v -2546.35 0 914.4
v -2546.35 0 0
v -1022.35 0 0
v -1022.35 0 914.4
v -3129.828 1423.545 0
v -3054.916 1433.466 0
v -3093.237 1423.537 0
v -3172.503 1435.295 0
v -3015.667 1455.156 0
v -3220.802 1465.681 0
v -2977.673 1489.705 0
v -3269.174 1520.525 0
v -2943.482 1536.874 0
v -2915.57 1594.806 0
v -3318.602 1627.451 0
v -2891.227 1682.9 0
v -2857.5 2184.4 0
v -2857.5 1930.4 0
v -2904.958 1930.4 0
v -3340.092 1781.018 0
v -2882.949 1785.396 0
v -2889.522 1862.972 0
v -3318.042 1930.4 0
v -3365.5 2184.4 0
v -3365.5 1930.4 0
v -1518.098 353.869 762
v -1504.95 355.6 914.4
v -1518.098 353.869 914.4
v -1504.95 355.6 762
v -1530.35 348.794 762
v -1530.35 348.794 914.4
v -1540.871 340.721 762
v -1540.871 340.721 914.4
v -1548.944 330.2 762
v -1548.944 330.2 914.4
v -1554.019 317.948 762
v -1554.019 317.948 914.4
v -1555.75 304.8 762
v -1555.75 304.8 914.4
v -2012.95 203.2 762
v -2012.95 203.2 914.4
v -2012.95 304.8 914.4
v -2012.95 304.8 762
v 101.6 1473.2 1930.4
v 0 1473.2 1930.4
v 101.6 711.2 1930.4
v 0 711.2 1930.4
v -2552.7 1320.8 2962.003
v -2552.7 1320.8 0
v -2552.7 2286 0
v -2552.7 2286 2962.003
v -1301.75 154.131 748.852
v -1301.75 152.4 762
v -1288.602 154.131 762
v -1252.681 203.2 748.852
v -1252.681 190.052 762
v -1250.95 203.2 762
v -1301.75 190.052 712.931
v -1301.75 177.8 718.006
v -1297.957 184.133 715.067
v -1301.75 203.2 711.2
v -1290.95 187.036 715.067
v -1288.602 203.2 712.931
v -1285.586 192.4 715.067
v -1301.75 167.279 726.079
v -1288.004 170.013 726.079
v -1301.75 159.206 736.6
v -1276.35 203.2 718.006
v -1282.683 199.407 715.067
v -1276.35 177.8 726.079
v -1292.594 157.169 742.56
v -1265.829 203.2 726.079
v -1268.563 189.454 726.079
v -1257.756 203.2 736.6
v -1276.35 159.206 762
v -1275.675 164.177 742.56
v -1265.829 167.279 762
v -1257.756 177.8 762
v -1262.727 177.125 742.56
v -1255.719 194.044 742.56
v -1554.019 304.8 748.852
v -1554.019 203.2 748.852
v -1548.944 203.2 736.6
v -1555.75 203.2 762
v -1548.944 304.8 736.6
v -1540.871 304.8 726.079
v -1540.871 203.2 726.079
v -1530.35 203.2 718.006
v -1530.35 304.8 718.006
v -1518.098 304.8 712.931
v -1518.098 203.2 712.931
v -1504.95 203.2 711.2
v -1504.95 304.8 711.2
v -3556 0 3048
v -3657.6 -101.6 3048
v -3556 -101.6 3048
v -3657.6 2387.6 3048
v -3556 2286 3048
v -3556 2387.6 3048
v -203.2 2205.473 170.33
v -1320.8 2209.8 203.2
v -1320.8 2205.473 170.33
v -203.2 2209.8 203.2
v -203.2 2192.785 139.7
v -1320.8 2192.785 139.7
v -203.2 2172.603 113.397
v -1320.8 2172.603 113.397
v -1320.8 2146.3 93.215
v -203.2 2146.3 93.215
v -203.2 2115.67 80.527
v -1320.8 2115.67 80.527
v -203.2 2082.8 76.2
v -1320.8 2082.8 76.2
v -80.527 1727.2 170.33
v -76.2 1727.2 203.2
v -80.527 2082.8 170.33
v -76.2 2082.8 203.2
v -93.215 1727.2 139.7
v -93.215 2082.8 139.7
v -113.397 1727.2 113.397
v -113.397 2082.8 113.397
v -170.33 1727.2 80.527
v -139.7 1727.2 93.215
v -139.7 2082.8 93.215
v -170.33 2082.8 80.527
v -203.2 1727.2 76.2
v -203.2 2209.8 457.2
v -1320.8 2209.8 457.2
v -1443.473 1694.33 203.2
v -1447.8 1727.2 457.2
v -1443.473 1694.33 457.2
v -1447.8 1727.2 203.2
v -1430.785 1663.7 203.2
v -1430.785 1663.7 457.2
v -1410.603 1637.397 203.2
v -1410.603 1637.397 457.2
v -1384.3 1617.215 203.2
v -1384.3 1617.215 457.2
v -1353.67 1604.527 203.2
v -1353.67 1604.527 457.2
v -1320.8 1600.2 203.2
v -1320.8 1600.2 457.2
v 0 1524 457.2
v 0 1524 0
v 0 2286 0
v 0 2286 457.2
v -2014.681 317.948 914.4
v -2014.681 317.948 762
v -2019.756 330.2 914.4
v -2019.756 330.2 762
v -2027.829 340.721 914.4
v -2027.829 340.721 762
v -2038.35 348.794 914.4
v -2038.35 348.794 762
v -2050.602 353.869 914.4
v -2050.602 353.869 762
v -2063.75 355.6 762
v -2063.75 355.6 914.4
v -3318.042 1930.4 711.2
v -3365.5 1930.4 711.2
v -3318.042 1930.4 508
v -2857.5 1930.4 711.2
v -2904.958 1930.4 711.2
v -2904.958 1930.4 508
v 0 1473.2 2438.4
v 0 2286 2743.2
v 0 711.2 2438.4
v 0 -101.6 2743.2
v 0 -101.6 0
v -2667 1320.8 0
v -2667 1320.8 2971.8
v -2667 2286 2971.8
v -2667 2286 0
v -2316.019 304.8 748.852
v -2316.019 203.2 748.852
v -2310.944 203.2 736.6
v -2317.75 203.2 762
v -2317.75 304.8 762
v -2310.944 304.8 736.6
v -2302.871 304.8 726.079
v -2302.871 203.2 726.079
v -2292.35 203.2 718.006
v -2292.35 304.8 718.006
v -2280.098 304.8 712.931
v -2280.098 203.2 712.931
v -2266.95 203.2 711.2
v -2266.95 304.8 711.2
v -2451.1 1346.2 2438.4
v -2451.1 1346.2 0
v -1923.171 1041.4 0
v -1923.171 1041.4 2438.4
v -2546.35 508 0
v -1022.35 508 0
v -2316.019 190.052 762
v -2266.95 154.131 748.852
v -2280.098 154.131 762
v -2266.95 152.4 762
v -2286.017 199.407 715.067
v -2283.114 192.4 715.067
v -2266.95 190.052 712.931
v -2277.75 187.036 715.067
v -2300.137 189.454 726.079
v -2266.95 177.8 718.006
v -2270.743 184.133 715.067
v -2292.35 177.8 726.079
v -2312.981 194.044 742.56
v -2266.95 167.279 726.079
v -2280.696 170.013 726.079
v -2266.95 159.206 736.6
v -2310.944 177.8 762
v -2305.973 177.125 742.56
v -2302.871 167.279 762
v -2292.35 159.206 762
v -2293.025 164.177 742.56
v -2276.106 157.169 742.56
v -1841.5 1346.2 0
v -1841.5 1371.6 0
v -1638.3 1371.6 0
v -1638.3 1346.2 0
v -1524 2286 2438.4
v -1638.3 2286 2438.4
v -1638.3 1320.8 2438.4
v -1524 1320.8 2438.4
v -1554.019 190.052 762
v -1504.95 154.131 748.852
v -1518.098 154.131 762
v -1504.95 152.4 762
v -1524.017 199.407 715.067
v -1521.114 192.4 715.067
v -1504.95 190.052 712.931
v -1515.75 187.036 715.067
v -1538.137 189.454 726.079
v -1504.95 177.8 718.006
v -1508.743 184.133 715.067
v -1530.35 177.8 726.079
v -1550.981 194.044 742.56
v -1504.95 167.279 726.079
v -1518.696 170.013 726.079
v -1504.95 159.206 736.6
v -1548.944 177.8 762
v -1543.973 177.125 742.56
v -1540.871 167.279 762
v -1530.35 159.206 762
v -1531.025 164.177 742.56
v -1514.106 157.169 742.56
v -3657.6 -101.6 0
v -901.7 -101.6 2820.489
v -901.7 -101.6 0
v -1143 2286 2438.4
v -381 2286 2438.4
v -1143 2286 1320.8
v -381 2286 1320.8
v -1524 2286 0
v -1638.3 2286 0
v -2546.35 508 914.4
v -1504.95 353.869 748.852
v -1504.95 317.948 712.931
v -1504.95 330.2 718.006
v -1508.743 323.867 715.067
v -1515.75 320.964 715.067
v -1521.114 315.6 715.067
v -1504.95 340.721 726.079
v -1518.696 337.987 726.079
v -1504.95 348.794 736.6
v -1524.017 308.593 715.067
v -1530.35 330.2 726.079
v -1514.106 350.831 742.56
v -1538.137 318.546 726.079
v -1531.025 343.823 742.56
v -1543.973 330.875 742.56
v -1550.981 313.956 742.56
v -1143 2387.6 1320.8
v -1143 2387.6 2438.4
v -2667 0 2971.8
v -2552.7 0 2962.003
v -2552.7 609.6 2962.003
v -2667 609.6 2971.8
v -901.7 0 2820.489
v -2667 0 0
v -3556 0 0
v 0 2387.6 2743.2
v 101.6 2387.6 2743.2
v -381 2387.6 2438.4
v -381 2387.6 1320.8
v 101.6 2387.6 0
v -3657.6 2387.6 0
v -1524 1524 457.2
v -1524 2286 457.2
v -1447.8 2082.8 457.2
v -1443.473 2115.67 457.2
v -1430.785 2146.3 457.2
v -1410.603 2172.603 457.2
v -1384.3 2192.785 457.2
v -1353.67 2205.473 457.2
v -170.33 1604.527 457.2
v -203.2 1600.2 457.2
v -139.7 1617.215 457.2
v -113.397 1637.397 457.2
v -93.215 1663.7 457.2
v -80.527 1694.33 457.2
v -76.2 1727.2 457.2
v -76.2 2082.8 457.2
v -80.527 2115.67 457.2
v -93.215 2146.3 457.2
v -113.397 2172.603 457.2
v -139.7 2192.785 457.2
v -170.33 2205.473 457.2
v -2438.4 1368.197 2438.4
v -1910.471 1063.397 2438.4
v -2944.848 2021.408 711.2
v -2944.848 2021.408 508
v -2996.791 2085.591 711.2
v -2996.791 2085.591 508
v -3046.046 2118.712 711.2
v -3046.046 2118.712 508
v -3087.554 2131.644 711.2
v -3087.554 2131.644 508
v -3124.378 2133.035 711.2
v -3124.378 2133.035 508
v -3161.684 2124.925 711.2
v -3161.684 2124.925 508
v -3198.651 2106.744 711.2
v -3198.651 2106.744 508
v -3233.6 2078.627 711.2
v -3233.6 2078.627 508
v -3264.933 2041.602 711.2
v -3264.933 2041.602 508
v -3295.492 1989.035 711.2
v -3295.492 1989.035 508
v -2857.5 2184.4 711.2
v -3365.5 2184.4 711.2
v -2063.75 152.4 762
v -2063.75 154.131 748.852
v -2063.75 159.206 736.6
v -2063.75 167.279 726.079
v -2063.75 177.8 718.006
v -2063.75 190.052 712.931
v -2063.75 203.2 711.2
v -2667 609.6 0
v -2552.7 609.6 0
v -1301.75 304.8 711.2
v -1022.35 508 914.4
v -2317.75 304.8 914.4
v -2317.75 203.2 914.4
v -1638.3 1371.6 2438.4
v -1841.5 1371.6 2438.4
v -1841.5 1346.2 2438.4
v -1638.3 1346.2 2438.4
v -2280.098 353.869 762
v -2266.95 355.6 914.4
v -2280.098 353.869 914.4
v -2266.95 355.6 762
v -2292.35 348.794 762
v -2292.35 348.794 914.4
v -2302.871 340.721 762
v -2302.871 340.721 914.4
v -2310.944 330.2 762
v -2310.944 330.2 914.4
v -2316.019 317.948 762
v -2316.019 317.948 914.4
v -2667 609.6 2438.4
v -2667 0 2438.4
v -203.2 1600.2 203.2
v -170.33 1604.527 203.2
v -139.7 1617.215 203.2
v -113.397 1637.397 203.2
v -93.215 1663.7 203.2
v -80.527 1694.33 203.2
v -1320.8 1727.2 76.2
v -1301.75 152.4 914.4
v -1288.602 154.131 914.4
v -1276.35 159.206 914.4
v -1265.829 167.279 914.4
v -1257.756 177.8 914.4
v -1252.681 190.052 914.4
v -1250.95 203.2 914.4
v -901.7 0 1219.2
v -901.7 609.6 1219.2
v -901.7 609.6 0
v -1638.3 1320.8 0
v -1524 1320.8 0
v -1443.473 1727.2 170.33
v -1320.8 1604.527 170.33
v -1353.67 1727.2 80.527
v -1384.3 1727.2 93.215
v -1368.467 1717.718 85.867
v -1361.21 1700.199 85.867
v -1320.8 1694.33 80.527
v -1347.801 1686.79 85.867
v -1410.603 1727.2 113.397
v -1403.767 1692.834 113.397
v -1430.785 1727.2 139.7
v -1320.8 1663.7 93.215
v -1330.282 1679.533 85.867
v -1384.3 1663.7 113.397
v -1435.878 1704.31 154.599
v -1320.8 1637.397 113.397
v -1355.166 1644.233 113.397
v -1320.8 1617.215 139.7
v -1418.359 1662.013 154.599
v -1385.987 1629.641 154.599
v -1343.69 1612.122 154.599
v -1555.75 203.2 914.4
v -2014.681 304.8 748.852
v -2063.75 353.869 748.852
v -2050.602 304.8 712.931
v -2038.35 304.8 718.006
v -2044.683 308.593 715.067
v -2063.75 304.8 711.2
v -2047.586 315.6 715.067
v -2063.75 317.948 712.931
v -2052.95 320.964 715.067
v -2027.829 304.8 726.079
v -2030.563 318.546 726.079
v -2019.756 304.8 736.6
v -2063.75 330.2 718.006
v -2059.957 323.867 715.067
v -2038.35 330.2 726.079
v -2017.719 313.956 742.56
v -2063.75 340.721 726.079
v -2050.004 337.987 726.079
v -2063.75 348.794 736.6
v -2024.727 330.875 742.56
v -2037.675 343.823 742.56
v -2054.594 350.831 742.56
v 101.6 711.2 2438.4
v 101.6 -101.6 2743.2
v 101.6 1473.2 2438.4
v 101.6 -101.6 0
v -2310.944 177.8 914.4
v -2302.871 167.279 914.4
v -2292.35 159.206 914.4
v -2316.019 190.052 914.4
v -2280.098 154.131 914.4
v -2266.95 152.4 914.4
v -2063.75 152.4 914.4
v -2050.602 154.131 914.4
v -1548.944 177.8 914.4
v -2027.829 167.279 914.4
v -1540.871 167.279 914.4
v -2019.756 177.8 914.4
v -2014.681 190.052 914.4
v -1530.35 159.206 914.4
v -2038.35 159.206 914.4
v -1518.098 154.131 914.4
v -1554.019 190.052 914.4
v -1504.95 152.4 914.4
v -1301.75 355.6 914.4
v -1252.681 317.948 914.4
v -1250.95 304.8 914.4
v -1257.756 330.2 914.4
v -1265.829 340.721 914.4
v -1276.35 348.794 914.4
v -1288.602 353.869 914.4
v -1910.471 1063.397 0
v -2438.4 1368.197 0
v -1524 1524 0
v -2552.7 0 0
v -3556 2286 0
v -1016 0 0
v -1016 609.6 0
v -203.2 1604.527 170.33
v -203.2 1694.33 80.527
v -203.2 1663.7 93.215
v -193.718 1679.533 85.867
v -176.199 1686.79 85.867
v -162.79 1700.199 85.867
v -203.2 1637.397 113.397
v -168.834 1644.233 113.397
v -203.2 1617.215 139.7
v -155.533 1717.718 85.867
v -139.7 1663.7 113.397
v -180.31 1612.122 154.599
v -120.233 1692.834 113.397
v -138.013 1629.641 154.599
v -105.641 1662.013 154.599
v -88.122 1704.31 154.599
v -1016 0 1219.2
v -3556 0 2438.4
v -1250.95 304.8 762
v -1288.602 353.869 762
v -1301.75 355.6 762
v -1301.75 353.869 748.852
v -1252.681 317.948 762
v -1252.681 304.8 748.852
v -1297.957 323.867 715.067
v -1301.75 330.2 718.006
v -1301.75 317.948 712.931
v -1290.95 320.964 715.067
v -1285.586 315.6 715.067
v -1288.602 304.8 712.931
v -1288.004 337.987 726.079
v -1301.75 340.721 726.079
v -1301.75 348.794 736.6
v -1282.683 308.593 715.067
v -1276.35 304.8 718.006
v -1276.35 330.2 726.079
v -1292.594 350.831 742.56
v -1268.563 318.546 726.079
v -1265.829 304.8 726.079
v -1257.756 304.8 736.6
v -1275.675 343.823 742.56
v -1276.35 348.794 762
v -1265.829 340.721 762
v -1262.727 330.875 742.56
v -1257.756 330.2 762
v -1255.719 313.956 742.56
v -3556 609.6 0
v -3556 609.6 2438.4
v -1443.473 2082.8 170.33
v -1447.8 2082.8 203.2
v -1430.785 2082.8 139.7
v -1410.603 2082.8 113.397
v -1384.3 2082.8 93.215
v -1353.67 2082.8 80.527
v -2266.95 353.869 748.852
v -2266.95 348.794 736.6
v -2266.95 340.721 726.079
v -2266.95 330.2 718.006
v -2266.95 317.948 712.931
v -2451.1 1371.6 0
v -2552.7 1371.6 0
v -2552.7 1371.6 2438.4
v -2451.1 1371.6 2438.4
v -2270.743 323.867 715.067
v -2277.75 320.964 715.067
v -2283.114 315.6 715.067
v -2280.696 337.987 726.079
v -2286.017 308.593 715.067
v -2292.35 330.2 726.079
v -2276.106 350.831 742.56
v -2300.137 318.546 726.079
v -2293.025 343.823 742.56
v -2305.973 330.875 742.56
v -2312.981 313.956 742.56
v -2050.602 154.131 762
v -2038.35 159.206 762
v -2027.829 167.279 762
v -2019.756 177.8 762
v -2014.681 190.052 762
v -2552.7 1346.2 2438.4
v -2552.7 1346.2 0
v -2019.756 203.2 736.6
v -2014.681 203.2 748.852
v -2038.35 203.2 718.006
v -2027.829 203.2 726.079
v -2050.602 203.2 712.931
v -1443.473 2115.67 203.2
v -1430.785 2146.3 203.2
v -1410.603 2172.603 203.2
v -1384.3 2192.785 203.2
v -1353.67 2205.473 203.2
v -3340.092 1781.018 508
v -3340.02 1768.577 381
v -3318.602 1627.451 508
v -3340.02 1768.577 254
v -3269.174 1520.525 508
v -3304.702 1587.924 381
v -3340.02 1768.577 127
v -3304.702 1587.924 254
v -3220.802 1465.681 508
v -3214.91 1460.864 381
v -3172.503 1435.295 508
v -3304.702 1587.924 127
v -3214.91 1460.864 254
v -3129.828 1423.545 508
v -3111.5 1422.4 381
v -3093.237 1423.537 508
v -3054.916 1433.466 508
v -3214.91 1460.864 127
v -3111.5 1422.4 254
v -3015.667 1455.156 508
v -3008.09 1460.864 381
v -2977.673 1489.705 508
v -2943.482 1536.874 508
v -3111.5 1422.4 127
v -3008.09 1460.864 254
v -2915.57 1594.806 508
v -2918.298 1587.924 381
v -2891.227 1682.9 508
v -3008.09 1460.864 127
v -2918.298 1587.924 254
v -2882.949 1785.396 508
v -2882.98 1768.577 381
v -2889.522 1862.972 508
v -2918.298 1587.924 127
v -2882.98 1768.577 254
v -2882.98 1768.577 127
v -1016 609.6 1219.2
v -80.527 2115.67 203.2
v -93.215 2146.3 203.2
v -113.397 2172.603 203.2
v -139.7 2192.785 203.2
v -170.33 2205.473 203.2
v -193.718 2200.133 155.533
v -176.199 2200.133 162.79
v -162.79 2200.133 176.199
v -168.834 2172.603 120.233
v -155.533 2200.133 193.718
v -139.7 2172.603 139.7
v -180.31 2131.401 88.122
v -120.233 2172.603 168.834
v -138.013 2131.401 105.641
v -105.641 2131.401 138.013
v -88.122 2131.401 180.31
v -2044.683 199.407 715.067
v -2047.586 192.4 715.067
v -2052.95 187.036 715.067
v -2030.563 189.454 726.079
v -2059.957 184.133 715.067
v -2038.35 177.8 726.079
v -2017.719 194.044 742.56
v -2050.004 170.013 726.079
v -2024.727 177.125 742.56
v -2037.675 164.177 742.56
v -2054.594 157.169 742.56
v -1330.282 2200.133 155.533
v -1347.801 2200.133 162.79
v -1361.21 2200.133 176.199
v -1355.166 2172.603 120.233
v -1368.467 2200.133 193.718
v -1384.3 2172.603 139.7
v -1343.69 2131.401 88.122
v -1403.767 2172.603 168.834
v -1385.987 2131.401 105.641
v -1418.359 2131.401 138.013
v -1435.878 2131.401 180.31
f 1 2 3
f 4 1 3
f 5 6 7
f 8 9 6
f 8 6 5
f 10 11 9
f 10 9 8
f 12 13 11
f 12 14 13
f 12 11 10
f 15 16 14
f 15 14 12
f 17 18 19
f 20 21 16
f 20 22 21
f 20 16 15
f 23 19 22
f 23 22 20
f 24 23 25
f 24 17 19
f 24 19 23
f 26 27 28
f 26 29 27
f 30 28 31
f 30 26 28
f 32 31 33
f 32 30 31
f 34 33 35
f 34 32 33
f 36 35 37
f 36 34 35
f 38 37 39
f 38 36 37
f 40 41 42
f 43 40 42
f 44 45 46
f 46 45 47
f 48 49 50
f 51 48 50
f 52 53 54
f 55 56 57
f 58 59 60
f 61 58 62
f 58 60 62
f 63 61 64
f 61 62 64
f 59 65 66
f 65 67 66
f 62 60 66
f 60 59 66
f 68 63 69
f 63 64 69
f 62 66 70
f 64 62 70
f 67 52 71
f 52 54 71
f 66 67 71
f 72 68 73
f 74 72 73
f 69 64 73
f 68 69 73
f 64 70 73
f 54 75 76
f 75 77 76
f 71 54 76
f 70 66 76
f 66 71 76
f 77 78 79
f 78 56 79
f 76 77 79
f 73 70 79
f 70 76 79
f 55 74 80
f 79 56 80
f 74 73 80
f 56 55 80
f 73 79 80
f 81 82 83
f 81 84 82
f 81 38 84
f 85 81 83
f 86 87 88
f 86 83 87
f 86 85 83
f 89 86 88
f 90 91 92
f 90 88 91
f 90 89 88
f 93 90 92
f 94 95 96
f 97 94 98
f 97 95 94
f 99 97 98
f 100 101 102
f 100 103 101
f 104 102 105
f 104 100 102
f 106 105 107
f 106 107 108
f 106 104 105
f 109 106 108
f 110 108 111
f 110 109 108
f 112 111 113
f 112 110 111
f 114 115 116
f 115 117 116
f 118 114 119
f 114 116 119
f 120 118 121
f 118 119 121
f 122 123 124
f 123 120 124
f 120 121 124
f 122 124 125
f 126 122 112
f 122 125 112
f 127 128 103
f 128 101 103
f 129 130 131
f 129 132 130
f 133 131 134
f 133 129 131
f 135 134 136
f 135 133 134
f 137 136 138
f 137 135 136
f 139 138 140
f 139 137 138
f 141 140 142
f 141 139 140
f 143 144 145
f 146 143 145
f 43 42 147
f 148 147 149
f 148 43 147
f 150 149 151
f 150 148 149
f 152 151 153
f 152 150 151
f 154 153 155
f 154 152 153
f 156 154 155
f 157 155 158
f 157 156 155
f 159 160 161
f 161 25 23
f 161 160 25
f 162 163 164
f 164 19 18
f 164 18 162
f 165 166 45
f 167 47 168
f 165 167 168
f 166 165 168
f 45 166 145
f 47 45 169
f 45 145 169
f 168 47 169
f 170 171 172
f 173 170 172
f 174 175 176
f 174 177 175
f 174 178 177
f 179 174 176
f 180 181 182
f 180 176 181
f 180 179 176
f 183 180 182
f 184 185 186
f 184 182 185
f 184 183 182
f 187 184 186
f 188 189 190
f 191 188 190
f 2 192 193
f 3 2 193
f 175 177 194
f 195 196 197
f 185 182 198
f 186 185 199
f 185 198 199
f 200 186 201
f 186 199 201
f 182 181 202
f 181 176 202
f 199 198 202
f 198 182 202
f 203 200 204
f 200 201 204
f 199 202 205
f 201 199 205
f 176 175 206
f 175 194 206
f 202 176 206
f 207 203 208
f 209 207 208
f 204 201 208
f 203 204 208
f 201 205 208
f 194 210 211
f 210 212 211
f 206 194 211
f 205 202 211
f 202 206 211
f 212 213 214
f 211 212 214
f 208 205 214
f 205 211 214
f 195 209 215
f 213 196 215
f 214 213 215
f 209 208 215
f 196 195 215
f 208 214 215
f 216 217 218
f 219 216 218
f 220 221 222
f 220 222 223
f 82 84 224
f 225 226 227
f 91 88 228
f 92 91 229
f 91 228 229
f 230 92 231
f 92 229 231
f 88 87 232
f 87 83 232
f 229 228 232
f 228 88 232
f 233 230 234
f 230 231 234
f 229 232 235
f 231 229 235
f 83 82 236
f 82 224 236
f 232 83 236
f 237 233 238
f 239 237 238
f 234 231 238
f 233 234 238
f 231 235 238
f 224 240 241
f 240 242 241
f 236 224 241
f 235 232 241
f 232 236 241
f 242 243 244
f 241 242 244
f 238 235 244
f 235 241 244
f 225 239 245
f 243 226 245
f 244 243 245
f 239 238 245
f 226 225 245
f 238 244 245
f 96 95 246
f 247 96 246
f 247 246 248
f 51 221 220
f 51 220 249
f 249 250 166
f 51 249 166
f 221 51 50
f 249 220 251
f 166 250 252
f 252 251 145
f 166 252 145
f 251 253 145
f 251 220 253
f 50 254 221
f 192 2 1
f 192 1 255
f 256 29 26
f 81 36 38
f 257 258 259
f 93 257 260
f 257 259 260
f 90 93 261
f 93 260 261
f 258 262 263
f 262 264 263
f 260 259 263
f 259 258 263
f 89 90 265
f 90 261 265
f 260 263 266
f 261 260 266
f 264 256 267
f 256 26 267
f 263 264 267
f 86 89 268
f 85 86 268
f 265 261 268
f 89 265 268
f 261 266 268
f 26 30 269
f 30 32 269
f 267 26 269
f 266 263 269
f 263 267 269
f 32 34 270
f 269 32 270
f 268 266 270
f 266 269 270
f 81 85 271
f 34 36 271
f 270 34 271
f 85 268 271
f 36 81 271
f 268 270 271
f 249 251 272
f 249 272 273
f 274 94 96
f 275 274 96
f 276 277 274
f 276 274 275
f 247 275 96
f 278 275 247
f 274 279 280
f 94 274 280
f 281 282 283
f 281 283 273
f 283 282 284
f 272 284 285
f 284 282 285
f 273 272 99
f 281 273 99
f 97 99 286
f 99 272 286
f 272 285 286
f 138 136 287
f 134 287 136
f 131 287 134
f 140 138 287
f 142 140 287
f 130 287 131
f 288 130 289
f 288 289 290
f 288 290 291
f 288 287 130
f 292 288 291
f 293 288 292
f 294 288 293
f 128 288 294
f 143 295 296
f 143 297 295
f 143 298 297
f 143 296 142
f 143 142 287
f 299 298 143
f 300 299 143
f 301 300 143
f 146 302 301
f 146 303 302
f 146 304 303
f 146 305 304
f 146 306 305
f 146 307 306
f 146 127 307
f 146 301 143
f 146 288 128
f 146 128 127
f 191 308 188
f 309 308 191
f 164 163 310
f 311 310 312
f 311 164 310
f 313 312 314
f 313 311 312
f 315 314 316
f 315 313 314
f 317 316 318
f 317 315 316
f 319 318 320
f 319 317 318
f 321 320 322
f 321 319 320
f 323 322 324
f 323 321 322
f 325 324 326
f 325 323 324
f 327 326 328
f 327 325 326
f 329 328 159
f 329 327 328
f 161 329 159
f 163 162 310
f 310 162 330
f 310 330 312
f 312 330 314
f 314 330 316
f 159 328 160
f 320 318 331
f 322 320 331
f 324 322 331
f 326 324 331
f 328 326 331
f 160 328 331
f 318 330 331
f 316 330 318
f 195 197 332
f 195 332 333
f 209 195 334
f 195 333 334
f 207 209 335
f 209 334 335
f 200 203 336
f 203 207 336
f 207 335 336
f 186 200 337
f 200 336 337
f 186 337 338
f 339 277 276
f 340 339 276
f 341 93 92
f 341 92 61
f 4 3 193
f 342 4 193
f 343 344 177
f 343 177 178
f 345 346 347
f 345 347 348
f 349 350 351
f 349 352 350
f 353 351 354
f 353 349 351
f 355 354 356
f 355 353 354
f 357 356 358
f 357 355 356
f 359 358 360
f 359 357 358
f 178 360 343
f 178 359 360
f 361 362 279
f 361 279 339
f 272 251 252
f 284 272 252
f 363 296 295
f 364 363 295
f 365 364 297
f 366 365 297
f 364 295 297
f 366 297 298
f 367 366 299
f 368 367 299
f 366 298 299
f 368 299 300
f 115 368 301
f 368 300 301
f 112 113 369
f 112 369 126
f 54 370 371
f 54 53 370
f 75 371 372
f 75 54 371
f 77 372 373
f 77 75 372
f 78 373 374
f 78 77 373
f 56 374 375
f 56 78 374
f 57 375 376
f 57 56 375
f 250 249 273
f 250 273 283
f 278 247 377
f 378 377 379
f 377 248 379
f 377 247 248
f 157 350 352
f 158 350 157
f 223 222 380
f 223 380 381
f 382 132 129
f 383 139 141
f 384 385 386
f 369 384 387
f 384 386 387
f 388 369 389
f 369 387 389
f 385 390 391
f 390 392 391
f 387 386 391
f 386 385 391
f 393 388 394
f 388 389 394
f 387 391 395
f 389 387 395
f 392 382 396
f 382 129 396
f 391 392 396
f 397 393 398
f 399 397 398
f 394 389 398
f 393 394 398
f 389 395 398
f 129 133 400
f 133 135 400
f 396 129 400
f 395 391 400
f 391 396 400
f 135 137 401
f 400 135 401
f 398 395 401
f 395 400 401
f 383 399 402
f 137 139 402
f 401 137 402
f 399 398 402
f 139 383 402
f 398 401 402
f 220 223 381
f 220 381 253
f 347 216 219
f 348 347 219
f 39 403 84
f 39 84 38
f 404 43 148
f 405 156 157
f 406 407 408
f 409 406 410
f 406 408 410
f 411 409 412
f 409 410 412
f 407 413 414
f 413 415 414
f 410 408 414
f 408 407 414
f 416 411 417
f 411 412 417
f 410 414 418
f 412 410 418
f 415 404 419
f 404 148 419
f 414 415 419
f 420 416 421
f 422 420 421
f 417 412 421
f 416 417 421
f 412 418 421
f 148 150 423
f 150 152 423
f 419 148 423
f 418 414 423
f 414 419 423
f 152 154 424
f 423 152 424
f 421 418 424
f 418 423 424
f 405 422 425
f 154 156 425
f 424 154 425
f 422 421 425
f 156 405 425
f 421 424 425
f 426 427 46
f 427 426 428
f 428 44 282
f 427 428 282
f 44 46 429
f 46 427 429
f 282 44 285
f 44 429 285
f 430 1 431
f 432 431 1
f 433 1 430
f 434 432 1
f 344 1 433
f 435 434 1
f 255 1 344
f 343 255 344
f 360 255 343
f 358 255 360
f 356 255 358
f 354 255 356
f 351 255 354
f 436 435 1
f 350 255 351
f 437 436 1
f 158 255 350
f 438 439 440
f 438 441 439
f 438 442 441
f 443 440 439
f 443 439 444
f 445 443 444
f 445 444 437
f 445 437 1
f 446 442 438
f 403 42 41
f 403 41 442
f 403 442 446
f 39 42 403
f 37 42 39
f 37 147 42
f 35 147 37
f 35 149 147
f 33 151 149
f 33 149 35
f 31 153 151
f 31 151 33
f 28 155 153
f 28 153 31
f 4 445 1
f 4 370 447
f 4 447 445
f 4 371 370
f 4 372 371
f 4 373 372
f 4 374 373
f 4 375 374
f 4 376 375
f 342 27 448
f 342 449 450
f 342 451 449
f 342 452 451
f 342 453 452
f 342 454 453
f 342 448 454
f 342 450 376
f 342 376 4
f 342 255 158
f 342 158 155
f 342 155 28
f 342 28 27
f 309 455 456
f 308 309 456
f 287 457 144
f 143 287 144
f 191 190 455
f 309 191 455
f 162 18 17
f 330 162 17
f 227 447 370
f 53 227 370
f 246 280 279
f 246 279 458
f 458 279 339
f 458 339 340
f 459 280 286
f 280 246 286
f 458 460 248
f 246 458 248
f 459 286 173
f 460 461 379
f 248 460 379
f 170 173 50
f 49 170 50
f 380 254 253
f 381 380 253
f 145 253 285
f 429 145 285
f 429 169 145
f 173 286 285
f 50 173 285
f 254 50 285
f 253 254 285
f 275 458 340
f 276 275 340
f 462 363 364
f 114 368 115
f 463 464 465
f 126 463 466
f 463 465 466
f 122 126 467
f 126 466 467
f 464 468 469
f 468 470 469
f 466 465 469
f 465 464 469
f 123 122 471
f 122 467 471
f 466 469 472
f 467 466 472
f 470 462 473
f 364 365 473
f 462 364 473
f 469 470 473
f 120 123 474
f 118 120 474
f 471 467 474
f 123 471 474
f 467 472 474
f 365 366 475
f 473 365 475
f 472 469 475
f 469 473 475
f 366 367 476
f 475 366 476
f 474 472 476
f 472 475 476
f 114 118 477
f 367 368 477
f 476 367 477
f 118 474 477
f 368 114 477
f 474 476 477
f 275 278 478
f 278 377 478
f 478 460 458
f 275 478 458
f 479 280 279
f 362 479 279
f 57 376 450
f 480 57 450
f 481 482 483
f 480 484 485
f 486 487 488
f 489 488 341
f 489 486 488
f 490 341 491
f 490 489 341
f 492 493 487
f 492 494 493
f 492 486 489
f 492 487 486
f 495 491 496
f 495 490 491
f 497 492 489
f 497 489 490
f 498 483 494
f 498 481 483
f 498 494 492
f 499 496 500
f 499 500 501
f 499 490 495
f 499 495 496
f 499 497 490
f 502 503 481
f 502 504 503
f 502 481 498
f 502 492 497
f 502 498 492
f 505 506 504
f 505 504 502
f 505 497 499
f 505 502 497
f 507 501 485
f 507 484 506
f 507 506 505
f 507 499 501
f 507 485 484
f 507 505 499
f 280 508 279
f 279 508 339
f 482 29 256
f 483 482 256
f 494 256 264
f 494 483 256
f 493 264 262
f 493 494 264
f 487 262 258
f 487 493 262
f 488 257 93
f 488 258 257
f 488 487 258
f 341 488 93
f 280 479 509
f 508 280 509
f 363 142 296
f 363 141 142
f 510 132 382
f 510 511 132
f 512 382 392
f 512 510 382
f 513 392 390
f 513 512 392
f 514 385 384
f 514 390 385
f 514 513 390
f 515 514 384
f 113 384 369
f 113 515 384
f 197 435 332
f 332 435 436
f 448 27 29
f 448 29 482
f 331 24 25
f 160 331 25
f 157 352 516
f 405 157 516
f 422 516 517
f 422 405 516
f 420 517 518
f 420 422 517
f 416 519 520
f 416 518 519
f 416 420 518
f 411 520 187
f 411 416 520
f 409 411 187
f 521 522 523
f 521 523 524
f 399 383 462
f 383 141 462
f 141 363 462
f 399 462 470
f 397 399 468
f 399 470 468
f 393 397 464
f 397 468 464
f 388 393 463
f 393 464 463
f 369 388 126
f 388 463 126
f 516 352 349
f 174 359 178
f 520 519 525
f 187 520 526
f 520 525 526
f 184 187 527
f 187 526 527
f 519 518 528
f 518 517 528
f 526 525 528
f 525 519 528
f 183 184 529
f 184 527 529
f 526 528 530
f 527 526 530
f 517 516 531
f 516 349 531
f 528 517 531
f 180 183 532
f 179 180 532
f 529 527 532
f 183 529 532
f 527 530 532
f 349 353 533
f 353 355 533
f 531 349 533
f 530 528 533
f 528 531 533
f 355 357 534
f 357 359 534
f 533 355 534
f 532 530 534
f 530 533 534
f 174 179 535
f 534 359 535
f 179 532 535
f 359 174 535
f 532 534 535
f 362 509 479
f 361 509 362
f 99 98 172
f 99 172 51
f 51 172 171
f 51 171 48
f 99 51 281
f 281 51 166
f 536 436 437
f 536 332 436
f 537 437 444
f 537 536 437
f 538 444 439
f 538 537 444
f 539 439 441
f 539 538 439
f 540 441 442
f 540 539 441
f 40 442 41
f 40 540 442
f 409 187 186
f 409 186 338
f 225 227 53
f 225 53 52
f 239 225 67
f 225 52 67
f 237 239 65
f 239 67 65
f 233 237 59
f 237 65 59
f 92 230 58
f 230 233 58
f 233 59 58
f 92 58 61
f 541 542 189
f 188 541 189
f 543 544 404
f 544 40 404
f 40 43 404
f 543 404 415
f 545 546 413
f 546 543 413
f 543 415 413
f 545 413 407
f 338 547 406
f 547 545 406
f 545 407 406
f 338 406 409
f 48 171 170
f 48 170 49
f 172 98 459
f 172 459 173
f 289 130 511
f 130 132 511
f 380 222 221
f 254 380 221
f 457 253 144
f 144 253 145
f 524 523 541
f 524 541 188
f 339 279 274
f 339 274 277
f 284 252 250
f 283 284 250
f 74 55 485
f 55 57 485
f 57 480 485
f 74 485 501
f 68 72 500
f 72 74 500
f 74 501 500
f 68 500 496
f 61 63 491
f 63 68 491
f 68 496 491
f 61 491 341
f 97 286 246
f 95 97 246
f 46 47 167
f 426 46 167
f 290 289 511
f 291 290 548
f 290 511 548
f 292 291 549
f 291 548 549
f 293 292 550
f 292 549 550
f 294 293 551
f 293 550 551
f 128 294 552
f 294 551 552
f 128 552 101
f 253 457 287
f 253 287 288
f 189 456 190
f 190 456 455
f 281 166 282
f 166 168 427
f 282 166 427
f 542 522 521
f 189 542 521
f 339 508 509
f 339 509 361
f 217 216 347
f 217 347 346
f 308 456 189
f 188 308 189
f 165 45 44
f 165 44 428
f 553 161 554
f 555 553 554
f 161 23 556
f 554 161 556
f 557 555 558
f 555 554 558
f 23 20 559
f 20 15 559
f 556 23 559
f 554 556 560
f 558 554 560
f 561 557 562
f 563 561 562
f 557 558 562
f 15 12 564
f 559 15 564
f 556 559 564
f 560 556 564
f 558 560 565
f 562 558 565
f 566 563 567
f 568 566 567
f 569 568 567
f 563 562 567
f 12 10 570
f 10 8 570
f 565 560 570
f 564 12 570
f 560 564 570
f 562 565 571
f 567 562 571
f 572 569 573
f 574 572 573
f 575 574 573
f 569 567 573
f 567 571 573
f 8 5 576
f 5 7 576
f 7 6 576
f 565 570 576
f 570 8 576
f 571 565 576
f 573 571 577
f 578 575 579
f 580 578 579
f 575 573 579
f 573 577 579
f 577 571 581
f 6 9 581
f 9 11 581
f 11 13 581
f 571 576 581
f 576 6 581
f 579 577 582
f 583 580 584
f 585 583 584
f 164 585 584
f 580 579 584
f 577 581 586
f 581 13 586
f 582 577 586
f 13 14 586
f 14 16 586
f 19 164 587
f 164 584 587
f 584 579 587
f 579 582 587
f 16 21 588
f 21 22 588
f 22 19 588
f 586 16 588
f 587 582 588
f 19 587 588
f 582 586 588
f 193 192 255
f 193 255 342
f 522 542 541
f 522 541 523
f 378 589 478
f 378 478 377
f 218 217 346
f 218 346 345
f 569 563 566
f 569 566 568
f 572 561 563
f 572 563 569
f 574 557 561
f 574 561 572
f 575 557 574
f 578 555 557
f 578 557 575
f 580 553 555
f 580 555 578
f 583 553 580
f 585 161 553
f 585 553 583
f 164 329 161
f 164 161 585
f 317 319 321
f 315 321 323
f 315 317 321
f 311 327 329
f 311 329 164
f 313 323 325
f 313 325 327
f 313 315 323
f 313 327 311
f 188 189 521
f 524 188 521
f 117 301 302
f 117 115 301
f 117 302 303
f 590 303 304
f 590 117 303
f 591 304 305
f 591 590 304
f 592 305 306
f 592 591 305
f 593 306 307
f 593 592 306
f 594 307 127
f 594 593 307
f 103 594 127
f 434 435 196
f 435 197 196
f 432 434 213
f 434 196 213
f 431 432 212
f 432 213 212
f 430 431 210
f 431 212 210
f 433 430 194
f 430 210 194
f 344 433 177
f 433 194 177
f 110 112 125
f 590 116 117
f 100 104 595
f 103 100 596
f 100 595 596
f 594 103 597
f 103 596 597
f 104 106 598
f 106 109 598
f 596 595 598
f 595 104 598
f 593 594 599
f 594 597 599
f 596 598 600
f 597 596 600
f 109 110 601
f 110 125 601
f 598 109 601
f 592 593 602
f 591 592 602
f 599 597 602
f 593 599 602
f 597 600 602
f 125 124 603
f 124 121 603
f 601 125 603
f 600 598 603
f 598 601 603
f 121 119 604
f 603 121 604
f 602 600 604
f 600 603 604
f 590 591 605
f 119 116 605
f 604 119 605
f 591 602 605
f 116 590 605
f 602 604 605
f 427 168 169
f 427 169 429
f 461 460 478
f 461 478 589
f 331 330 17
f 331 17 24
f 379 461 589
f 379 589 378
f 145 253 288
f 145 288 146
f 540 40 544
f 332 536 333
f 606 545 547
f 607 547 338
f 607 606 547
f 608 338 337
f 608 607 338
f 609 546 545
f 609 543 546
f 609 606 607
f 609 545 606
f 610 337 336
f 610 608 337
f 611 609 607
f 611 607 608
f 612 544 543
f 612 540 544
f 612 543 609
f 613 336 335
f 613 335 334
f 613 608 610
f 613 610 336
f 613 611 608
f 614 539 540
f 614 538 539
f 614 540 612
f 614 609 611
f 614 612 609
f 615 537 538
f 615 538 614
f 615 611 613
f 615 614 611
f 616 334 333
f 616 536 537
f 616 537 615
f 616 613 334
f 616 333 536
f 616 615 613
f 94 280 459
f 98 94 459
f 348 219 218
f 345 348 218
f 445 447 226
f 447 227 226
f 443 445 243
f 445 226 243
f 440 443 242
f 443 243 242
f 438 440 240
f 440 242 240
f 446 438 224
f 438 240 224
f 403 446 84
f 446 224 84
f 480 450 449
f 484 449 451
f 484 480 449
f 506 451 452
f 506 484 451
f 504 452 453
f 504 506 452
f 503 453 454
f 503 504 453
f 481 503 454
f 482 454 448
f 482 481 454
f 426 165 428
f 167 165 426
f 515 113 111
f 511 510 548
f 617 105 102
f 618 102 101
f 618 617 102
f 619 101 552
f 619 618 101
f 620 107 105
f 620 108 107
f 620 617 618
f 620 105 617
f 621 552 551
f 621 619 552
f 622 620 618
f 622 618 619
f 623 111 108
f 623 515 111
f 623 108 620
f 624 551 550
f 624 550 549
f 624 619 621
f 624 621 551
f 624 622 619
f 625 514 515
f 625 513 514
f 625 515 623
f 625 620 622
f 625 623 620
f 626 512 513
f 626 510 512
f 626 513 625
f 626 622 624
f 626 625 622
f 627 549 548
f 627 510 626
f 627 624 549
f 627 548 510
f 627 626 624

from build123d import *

# Parameters (mm, degrees)
F2_DEPTH      = 3048
F1_W          = 114.3
F1_H          = 965.2
F1_H_2        = 609.6
F3_DEPTH      = 3048
F4_DEPTH      = 2438.4
F5_W          = 101.6
F5_H          = 304.8
F6_DEPTH      = 2387.601
F6_DEPTH_BACK = 101.601
F7_W          = 1524
F7_H          = 762
F8_DEPTH      = 457.2
F9_T          = -76.2
F10_R         = 127
F12_DEPTH     = 2438.4
F11_W         = 203.2
F11_H         = 25.4
F13_DEPTH     = 2438.4
F11_W_2       = 101.6
F14_W         = 762
F14_H         = 1117.6
F15_DEPTH     = 101.601
F16_W         = 1524
F16_H         = 508
F17_DEPTH     = 914.4
F18_W         = 304.8
F18_H         = 203.2
F19_DEPTH     = 203.2
F20_R         = 50.8
F22_DEPTH     = 508
F23_DEPTH     = 711.2
F24_W         = 889
F24_H         = 609.6
F25_DEPTH     = 2438.4
F26_W         = 762
F26_H         = 508
F27_DEPTH     = 101.601
F28_DEPTH     = 1219.2


with BuildPart() as f2:
    # F0 (on Top) → F2 (new body)
    with BuildSketch(Plane.XY):
        Polygon((-3556, 0), (-3556, 2286), (0, 2286), (0, -101.6), (101.6, -101.6), (101.6, 2387.6), (-3657.6, 2387.6), (-3657.6, -101.6), (-901.7, -101.6), (-901.7, 0), align=None)
    extrude(amount=F2_DEPTH)

    # F1 (on Top) → F3 (join, through all)
    with BuildSketch(Plane.XY):
        with Locations((-2609.85, 1803.4)):
            Rectangle(F1_W, F1_H)
        with Locations((-2609.85, 304.8)):
            Rectangle(F1_W, F1_H_2)
    extrude(amount=F3_DEPTH)

    # F1 (on Top) → F4 (join)
    with BuildSketch(Plane.XY):
        with Locations((-1581.15, 1803.4)):
            Rectangle(F1_W, F1_H)
    extrude(amount=F4_DEPTH)

    # F5 (on Front) → F6 (cut, two sides)
    with BuildSketch(Plane.XZ) as f6_sk:
        Polygon((0, 3048), (-3556, 3048), (0, 2743.2), align=None)
        with Locations((50.8, 2895.6)):
            Rectangle(F5_W, F5_H)
    extrude(amount=-F6_DEPTH, mode=Mode.SUBTRACT)
    extrude(f6_sk.sketch, amount=F6_DEPTH_BACK, mode=Mode.SUBTRACT)

    # F14 (on face) → F15 (cut, through all)
    with BuildSketch(Plane.XZ.offset(-2286)):
        with Locations((-762, 1879.6)):
            Rectangle(F14_W, F14_H)
    extrude(amount=-F15_DEPTH, mode=Mode.SUBTRACT)

    # F26 (on face) → F27 (cut, through all)
    with BuildSketch(Plane(origin=(0, 0, 0), x_dir=(0, -1, 0), z_dir=(-1, 0, 0))):
        with Locations((-1092.2, 2184.4)):
            Rectangle(F26_W, F26_H)
    extrude(amount=-F27_DEPTH, mode=Mode.SUBTRACT)

    # F1 (on Top) → F28 (join)
    with BuildSketch(Plane.XY):
        with Locations((-958.85, 304.8)):
            Rectangle(F1_W, F1_H_2)
    extrude(amount=F28_DEPTH)


with BuildPart() as f8:
    # F7 (on Top) → F8 (new body)
    with BuildSketch(Plane.XY):
        with Locations((-762, 1905)):
            Rectangle(F7_W, F7_H)
    extrude(amount=F8_DEPTH)

    # F9
    f9_openings = [f8.faces().sort_by_distance(p)[0] for p in [
        (-762, 1905, 457.2),
    ]]
    offset(amount=F9_T, openings=f9_openings)

    # F10
    f10_edges = [f8.edges().sort_by_distance(p)[0] for p in [
        (-1447.8, 1600.2, 266.7),
        (-76.2, 1600.2, 266.7),
        (-1447.8, 1905, 76.2),
        (-762, 1600.2, 76.2),
        (-76.2, 1905, 76.2),
        (-762, 2209.8, 76.2),
        (-76.2, 2209.8, 266.7),
        (-1447.8, 2209.8, 266.7),
    ]]
    fillet(f10_edges, radius=F10_R)


with BuildPart() as f12:
    # F11 (on Top) → F12 (new body, through all)
    with BuildSketch(Plane.XY):
        Polygon((-2451.1, 1346.2), (-1923.170913853, 1041.4), (-1910.470913853, 1063.3970452561), (-2438.4, 1368.1970452561), align=None)
    extrude(amount=F12_DEPTH)


with BuildPart() as f13:
    # F11 (on Top) → F13 (new body, through all)
    with BuildSketch(Plane.XY):
        with Locations((-1739.9, 1358.9)):
            Rectangle(F11_W, F11_H)
    extrude(amount=F13_DEPTH)


with BuildPart() as f13b:
    # F11 (on Top) → F13, piece 2 (new body, through all)
    with BuildSketch(Plane.XY):
        with Locations((-2501.9, 1358.9)):
            Rectangle(F11_W_2, F11_H)
    extrude(amount=F13_DEPTH)


with BuildPart() as f17:
    # F16 (on Top) → F17 (new body)
    with BuildSketch(Plane.XY):
        with Locations((-1784.35, 254)):
            Rectangle(F16_W, F16_H)
    extrude(amount=F17_DEPTH)

    # F18 (on face) → F19 (cut)
    with BuildSketch(Plane.XY.offset(914.4)):
        with Locations((-2165.35, 254)):
            Rectangle(F18_W, F18_H)
        with Locations((-1403.35, 254)):
            Rectangle(F18_W, F18_H)
    extrude(amount=-F19_DEPTH, mode=Mode.SUBTRACT)

    # F20
    f20_edges = [f17.edges().sort_by_distance(p)[0] for p in [
        (-2317.75, 355.6, 812.8),
        (-2012.95, 355.6, 812.8),
        (-2317.75, 152.4, 812.8),
        (-2012.95, 152.4, 812.8),
        (-2012.95, 254, 711.2),
        (-2165.35, 355.6, 711.2),
        (-2317.75, 254, 711.2),
        (-2165.35, 152.4, 711.2),
        (-1250.95, 152.4, 812.8),
        (-1555.75, 152.4, 812.8),
        (-1250.95, 355.6, 812.8),
        (-1555.75, 355.6, 812.8),
        (-1403.35, 355.6, 711.2),
        (-1555.75, 254, 711.2),
        (-1403.35, 152.4, 711.2),
        (-1250.95, 254, 711.2),
    ]]
    fillet(f20_edges, radius=F20_R)


with BuildPart() as f22:
    # F21 (on Top) → F22 (new body)
    with BuildSketch(Plane.XY):
        with BuildLine():
            Line((-2904.9580933959, 1930.4), (-3318.0419066041, 1930.4))
            add(Edge.make_bspline(
                [(-3318.0419066041, 1930.4), (-3472.9483365572, 1422.4), (-3111.5, 1422.4), (-2750.0516634428, 1422.4), (-2904.9580933959, 1930.4)],
                knots=[1.1278852827, 1.1278852827, 1.1278852827, 3.1415926536, 3.1415926536, 5.1553000245, 5.1553000245, 5.1553000245], degree=2, weights=[1, 0.5345224838, 1, 0.5345224838, 1]))
        make_face()
        with BuildLine():
            add(Edge.make_bspline(
                [(-2904.9580933959, 1930.4), (-2966.9206653771, 2133.6), (-3111.5, 2133.6)],
                knots=[5.1553000245, 5.1553000245, 5.1553000245, 6.2831853072, 6.2831853072, 6.2831853072], degree=2, weights=[1, 0.8451542547, 1]))
            add(Edge.make_bspline(
                [(-3111.5, 2133.6), (-3256.0793346229, 2133.6), (-3318.0419066041, 1930.4)],
                knots=[0, 0, 0, 1.1278852827, 1.1278852827, 1.1278852827], degree=2, weights=[1, 0.8451542547, 1]))
            Line((-3318.0419066041, 1930.4), (-2904.9580933959, 1930.4))
        make_face()
    extrude(amount=F22_DEPTH)

    # F21 (on Top) → F23 (join)
    with BuildSketch(Plane.XY):
        with BuildLine():
            add(Edge.make_bspline(
                [(-3111.5, 2133.6), (-3256.0793346229, 2133.6), (-3318.0419066041, 1930.4)],
                knots=[0, 0, 0, 1.1278852827, 1.1278852827, 1.1278852827], degree=2, weights=[1, 0.8451542547, 1]))
            add(Edge.make_bspline(
                [(-2904.9580933959, 1930.4), (-2966.9206653771, 2133.6), (-3111.5, 2133.6)],
                knots=[5.1553000245, 5.1553000245, 5.1553000245, 6.2831853072, 6.2831853072, 6.2831853072], degree=2, weights=[1, 0.8451542547, 1]))
            Line((-2904.9580933959, 1930.4), (-2857.5, 1930.4))
            Line((-2857.5, 1930.4), (-2857.5, 2184.4))
            Line((-2857.5, 2184.4), (-3365.5, 2184.4))
            Line((-3365.5, 2184.4), (-3365.5, 1930.4))
            Line((-3365.5, 1930.4), (-3318.0419066041, 1930.4))
        make_face()
    extrude(amount=F23_DEPTH)


with BuildPart() as f25:
    # F24 (on Top) → F25 (new body)
    with BuildSketch(Plane.XY):
        with Locations((-3111.5, 304.8)):
            Rectangle(F24_W, F24_H)
    extrude(amount=F25_DEPTH)


solid = Compound([f2.part, f8.part, f12.part, f13.part, f13b.part, f17.part, f22.part, f25.part])
